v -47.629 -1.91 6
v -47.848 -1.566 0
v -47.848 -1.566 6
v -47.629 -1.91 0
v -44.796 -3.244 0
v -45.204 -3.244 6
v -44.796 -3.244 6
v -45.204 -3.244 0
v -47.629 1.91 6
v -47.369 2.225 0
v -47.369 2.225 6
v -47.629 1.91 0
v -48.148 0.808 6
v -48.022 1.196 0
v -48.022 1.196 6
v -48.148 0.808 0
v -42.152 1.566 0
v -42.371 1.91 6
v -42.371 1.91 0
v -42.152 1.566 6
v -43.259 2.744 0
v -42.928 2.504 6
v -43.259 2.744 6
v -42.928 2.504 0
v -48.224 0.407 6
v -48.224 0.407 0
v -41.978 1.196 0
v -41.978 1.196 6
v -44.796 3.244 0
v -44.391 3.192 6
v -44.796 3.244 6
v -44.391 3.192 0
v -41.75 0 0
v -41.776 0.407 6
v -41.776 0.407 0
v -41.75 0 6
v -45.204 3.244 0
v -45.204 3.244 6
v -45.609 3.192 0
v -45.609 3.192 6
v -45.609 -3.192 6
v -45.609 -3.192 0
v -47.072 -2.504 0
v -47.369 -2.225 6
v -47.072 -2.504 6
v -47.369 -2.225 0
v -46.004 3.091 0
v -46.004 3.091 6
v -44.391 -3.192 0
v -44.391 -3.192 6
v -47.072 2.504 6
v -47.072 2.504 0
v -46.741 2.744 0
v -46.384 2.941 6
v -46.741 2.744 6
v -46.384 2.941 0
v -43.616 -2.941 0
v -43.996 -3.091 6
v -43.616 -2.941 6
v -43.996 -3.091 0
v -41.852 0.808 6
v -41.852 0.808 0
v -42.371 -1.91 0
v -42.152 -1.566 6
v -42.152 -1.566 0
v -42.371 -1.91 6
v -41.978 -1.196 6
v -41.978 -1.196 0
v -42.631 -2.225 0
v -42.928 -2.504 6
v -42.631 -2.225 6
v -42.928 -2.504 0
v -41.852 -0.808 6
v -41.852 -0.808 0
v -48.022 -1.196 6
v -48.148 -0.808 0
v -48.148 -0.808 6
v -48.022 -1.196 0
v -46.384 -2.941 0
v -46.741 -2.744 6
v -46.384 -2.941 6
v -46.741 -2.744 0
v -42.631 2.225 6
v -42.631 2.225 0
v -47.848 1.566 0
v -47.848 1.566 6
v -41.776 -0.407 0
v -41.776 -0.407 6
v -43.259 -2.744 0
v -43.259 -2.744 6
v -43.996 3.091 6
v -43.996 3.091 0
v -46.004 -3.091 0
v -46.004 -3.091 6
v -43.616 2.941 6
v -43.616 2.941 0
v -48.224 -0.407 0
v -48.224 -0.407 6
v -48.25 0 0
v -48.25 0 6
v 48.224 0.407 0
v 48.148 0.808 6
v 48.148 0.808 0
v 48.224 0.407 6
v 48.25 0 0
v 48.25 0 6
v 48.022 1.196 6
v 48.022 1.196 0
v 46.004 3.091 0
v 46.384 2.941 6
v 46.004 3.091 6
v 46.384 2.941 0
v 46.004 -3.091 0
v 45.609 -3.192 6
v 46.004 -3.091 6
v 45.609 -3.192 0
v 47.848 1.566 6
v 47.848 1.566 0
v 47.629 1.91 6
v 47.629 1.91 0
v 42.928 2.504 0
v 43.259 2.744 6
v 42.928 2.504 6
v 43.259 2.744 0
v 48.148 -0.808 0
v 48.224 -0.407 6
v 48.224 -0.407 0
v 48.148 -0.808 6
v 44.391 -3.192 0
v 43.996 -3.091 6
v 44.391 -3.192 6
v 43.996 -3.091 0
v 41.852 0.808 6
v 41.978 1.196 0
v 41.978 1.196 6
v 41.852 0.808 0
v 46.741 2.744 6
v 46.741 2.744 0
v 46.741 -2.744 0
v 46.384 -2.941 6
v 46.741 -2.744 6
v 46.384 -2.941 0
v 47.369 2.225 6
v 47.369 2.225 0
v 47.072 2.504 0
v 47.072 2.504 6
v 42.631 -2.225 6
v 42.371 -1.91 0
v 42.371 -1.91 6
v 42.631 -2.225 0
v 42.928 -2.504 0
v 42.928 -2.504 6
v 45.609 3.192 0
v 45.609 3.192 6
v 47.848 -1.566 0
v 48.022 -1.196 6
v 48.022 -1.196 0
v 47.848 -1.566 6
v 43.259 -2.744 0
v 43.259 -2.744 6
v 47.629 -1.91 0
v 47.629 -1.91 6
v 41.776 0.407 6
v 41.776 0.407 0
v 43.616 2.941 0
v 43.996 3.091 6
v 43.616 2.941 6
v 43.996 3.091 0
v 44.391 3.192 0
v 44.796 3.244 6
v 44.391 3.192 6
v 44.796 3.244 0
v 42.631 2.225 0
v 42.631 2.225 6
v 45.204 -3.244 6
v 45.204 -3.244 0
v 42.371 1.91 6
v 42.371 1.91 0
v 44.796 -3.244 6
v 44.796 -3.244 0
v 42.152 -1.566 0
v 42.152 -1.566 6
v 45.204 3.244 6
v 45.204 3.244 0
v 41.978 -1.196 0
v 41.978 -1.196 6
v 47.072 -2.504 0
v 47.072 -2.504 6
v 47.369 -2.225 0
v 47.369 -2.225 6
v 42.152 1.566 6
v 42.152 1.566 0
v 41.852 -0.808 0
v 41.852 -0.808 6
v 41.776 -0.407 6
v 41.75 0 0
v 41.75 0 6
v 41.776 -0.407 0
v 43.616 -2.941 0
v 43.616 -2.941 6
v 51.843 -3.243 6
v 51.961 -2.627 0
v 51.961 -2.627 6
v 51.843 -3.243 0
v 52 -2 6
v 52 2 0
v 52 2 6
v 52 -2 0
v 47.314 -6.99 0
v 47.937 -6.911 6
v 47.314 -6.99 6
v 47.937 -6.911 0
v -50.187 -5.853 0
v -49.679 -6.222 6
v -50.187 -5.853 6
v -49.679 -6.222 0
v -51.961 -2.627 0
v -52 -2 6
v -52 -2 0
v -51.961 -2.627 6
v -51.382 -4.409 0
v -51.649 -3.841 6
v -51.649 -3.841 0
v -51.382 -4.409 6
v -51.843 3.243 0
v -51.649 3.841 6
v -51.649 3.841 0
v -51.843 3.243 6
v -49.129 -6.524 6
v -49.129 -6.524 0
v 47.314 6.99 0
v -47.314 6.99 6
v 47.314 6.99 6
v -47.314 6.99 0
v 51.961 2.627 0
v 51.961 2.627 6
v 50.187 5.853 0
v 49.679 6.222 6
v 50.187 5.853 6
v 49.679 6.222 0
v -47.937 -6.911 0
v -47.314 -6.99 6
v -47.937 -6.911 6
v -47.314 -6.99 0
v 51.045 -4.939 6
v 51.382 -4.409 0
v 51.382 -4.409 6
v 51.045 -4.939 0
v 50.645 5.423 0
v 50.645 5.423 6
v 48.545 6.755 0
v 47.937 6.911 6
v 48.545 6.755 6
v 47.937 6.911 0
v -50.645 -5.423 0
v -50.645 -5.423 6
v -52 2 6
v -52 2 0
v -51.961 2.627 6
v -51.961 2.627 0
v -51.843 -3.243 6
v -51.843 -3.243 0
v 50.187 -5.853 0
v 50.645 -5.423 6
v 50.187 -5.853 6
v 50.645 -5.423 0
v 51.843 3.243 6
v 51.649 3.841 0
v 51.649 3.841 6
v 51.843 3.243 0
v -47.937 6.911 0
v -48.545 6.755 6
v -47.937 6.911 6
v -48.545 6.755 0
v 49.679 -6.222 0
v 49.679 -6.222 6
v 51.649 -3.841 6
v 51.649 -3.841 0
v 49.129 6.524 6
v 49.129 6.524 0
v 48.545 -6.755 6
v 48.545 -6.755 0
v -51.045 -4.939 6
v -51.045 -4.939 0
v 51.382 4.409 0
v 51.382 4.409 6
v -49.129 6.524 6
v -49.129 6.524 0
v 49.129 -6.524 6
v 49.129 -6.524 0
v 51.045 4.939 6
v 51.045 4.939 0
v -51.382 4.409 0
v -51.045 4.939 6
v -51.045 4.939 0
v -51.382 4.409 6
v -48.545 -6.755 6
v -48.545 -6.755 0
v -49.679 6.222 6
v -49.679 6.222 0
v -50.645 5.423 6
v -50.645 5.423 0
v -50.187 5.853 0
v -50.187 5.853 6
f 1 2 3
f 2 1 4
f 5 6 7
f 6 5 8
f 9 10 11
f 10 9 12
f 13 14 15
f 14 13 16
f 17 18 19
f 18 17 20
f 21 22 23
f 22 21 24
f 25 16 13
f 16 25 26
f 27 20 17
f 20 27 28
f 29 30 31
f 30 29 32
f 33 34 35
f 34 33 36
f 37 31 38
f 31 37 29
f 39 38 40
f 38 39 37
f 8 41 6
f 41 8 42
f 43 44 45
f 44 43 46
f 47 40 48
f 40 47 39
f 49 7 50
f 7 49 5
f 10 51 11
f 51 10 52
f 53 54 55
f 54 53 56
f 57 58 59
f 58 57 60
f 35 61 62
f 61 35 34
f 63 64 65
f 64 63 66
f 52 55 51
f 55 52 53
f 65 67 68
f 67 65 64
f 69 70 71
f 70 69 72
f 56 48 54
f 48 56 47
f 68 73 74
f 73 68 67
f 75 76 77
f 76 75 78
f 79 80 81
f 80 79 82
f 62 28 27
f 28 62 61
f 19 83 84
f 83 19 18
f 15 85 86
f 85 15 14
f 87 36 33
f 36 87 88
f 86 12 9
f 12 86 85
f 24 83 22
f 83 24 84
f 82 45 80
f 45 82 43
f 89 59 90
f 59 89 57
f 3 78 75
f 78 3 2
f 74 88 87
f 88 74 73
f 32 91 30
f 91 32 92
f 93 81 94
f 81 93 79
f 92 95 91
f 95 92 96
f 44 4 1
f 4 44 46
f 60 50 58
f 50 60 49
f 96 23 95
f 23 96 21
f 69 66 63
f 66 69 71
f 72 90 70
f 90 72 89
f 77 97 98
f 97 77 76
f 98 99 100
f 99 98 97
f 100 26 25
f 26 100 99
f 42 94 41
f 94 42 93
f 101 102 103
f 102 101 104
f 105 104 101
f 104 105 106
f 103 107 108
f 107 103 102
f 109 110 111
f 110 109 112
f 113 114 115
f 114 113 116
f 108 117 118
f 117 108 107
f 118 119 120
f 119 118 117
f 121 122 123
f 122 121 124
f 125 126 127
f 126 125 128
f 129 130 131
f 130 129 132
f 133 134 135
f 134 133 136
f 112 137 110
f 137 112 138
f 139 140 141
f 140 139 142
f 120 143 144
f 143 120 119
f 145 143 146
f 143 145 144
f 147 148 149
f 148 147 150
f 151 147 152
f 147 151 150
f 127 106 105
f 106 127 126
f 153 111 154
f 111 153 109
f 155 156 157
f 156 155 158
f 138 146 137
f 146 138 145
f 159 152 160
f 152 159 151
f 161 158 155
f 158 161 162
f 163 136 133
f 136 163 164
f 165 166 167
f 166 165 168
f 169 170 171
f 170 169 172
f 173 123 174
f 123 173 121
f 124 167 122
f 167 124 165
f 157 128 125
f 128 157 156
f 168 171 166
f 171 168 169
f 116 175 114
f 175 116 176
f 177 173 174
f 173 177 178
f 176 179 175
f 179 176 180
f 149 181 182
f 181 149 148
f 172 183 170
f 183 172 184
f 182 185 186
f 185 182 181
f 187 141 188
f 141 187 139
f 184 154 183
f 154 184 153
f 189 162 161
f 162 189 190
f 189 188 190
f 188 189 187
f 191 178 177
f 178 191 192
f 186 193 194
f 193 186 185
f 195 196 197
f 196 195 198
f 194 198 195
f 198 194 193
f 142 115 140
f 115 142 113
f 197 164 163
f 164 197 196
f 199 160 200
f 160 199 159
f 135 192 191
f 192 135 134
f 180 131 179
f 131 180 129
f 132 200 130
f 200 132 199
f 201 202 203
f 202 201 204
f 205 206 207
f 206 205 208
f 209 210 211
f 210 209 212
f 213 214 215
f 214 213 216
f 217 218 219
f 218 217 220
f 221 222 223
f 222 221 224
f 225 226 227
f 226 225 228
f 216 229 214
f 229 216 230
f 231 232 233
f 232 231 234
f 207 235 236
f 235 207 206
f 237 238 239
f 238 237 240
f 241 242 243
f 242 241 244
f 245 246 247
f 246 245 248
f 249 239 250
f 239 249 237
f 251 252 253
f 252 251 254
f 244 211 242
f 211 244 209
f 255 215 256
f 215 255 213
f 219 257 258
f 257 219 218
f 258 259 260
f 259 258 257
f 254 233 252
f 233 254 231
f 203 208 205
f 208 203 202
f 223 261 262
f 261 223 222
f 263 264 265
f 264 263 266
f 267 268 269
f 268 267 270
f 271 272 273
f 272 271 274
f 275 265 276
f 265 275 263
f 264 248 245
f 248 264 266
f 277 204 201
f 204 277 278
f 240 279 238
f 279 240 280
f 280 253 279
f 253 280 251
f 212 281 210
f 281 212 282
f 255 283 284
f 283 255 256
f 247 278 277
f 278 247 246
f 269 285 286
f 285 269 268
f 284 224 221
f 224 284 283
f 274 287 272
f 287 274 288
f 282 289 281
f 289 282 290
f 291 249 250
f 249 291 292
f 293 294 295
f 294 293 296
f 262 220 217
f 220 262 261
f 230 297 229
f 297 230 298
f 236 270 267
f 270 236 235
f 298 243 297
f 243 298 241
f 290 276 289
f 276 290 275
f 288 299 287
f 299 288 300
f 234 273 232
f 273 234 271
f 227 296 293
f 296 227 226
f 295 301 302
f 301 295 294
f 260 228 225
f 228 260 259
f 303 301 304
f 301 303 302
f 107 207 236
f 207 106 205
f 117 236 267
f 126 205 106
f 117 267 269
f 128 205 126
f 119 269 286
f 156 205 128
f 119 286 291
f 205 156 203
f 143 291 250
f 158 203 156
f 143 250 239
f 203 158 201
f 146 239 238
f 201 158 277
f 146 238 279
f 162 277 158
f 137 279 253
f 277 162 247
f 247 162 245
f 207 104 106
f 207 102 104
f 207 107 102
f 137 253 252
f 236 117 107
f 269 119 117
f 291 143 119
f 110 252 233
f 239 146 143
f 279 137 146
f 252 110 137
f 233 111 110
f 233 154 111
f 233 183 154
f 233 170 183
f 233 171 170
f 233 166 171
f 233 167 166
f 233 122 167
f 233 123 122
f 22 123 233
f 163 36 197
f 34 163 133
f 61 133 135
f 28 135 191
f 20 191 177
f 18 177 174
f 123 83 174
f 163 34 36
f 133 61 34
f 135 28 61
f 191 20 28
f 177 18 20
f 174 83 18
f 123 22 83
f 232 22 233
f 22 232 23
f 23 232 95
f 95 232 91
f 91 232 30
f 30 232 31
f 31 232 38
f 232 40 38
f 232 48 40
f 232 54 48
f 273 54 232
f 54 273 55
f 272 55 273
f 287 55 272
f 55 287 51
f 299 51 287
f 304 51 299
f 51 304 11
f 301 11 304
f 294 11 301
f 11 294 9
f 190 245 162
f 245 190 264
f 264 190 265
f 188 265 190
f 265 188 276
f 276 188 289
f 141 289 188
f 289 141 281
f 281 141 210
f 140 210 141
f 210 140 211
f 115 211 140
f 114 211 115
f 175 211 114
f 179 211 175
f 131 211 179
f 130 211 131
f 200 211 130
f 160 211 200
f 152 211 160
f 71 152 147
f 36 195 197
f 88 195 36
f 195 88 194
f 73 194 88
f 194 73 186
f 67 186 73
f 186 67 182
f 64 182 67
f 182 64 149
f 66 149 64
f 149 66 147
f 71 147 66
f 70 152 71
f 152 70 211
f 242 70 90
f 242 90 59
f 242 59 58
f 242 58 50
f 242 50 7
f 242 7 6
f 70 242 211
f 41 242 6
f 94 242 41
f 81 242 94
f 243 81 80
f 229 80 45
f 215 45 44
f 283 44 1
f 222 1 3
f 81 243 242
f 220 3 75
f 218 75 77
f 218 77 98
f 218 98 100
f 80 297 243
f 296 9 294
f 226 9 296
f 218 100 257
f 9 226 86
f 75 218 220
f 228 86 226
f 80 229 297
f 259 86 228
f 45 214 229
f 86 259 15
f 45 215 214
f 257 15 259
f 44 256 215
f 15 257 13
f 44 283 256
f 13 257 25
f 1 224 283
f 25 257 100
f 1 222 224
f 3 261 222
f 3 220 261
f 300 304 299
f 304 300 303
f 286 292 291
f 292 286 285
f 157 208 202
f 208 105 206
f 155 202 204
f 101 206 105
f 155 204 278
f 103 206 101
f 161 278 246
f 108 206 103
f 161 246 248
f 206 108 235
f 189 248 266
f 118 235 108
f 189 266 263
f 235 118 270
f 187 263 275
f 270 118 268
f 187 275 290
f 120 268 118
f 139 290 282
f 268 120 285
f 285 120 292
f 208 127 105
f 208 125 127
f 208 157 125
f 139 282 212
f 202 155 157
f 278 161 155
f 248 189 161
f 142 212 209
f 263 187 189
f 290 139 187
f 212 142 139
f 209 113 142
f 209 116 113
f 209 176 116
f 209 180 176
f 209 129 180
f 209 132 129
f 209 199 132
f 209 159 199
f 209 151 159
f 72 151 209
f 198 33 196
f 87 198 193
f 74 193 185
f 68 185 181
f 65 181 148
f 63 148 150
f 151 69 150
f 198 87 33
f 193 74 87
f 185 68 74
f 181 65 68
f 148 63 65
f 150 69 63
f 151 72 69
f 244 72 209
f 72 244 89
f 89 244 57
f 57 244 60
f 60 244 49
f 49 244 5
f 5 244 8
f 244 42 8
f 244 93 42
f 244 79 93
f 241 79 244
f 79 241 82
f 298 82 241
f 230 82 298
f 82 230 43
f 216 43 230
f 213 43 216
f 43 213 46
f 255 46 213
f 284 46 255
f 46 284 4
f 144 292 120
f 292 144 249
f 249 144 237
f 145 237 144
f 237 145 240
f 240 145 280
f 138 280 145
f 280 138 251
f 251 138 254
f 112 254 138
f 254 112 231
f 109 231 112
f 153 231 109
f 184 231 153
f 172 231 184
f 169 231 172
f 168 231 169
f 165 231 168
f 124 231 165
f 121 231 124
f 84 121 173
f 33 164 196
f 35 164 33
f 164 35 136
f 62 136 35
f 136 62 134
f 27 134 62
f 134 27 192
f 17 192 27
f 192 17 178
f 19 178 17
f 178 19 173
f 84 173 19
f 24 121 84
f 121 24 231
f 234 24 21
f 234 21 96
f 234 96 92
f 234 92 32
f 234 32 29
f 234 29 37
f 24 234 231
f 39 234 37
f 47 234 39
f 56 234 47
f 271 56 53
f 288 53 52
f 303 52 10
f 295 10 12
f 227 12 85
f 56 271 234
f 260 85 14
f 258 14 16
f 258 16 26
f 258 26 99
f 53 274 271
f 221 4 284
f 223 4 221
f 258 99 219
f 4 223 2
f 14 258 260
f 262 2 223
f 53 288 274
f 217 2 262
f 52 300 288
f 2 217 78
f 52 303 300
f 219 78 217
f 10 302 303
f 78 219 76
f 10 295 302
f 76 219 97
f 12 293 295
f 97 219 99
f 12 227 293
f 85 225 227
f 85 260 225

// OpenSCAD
$fn = 50;


difference() {
	union() {
		hull() {
			translate(v = [-47.0000000000, 2.0000000000, 0]) {
				cylinder(h = 6, r = 5);
			}
			translate(v = [47.0000000000, 2.0000000000, 0]) {
				cylinder(h = 6, r = 5);
			}
			translate(v = [-47.0000000000, -2.0000000000, 0]) {
				cylinder(h = 6, r = 5);
			}
			translate(v = [47.0000000000, -2.0000000000, 0]) {
				cylinder(h = 6, r = 5);
			}
		}
	}
	union() {
		translate(v = [-45.0000000000, 0.0000000000, -100.0000000000]) {
			cylinder(h = 200, r = 3.2500000000);
		}
		translate(v = [-45.0000000000, 0.0000000000, -100.0000000000]) {
			cylinder(h = 200, r = 3.2500000000);
		}
		translate(v = [45.0000000000, 0.0000000000, -100.0000000000]) {
			cylinder(h = 200, r = 3.2500000000);
		}
		translate(v = [45.0000000000, 0.0000000000, -100.0000000000]) {
			cylinder(h = 200, r = 3.2500000000);
		}
	}
}
